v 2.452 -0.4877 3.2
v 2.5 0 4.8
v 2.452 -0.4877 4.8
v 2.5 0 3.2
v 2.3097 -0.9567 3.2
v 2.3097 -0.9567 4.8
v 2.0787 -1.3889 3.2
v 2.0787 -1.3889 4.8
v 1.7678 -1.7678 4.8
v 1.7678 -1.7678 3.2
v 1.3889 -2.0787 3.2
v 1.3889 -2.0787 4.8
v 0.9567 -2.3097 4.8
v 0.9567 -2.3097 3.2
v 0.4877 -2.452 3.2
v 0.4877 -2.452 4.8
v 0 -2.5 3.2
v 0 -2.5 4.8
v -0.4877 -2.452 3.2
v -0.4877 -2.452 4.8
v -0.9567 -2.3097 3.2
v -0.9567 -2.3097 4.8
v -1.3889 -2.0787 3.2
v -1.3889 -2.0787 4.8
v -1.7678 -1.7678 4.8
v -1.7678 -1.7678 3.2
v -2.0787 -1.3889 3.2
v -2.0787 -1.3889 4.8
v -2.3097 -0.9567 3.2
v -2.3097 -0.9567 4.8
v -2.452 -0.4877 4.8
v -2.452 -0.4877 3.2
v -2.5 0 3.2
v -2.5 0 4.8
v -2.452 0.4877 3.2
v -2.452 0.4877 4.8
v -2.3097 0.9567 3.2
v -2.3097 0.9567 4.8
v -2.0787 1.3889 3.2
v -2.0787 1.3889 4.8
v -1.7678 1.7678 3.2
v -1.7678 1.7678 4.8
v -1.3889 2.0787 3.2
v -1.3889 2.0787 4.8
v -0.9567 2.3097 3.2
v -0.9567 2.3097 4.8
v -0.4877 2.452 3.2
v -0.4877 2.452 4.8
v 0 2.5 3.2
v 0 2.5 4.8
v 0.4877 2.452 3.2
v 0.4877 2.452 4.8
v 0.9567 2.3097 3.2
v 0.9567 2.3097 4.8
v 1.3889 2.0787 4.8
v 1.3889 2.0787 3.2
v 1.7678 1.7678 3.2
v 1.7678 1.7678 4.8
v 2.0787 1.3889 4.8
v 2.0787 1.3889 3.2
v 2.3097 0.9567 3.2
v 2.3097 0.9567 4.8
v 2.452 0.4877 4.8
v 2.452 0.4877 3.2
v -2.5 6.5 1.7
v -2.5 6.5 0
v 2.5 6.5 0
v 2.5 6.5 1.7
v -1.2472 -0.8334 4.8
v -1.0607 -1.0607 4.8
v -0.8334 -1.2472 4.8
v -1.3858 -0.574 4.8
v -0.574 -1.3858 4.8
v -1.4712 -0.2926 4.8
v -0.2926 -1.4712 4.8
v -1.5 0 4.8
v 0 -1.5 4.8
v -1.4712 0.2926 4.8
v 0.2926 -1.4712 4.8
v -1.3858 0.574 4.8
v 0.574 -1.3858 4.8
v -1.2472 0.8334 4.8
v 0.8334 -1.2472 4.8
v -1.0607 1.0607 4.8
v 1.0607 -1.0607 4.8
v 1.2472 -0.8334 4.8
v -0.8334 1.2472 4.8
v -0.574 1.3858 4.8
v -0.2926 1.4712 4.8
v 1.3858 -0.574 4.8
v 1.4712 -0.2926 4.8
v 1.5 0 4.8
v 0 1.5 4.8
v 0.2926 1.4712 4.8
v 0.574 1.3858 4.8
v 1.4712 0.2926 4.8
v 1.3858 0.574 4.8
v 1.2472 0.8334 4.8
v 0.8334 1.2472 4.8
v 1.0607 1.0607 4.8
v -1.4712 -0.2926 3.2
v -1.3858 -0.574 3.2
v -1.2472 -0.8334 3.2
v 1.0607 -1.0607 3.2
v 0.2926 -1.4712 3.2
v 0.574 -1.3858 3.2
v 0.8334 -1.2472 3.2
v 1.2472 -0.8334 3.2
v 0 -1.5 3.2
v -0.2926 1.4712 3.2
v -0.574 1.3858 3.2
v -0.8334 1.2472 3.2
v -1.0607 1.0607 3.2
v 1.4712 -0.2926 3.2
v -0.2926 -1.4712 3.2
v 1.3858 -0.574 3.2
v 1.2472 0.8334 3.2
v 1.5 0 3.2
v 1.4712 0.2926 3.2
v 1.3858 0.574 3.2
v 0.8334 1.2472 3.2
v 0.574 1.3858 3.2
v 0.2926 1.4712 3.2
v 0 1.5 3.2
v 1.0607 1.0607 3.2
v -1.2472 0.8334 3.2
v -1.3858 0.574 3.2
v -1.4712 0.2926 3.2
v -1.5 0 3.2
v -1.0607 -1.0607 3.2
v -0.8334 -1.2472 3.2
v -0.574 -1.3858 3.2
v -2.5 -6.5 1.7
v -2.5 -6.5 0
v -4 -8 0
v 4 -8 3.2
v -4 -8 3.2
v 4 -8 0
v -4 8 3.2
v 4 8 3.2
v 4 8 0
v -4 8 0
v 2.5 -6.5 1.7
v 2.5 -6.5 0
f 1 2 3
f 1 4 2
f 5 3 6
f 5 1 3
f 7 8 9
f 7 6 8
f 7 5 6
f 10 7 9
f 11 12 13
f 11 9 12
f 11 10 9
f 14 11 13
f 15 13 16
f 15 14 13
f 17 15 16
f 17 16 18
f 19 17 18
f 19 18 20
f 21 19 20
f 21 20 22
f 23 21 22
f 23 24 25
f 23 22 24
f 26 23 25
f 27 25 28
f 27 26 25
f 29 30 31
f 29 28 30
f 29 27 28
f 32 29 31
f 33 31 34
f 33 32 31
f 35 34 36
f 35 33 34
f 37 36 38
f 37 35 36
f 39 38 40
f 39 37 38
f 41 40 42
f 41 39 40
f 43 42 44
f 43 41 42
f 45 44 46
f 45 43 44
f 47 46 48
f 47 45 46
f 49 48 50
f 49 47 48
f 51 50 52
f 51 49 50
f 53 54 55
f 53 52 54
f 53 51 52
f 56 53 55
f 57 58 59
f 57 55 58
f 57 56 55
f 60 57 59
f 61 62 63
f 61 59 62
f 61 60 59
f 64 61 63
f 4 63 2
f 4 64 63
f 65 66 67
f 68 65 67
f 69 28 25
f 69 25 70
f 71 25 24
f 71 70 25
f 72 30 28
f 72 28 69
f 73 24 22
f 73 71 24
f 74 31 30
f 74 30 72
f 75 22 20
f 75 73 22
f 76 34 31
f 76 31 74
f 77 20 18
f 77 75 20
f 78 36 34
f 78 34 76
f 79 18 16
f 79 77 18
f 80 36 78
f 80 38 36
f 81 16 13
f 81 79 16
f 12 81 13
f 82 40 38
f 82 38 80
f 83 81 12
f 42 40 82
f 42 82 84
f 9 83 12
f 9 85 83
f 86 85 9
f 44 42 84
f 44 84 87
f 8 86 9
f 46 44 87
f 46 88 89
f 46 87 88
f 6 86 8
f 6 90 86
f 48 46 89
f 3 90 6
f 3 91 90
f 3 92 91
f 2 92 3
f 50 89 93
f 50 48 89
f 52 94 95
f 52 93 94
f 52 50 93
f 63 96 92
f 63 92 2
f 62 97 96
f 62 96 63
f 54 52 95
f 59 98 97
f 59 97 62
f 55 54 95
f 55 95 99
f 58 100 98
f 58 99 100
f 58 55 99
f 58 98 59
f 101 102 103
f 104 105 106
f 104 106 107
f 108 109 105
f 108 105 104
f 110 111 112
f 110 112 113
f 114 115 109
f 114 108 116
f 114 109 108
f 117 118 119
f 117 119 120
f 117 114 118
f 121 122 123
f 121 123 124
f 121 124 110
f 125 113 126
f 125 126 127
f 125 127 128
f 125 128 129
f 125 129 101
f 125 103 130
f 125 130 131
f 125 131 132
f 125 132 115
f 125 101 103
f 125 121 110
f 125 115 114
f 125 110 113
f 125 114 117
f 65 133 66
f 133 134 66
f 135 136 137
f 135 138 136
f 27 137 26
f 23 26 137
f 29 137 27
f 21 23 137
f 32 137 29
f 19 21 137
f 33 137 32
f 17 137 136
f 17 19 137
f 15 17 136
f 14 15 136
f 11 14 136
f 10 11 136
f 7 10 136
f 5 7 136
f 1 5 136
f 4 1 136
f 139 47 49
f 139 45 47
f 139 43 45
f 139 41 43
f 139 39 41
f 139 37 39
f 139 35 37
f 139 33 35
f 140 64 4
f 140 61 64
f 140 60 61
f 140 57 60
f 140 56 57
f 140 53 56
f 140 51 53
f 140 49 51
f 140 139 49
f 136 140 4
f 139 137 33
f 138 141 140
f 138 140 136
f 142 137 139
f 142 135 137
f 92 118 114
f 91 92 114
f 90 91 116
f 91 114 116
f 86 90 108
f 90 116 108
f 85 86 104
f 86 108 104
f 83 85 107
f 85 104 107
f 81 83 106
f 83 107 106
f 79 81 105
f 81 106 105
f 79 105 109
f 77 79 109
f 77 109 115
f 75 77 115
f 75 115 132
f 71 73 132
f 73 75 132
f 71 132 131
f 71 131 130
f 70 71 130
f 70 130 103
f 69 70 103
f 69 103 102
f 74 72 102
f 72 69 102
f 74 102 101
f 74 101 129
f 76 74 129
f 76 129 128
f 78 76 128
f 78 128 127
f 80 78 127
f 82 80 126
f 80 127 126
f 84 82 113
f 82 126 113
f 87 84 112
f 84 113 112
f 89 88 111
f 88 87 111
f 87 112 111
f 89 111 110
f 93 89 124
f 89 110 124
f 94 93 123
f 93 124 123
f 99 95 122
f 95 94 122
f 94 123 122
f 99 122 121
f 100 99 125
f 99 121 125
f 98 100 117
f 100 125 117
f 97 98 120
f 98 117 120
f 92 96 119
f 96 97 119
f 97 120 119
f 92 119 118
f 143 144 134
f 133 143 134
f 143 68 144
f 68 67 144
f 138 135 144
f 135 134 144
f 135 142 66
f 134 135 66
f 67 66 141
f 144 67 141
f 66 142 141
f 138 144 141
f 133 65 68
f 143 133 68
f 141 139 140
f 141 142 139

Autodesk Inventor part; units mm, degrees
ref_plane "YZ Plane" through (0, 0, 0) normal (1, 0, 0) x (0, 1, 0)
ref_plane "XZ Plane" through (0, 0, 0) normal (0, 1, 0) x (-1, 0, 0)
ref_plane "XY Plane" through (0, 0, 0) normal (0, 0, 1) x (1, 0, 0)
sketch "Sketch1" plane through (0, 0, 0) normal (0, 0, 1) x (1, 0, 0)
  line L0 (-4, 8) -> (4, 8)
  line L1 (4, 8) -> (4, -8)
  line L2 (4, -8) -> (-4, -8)
  line L3 (-4, -8) -> (-4, 8)
  point P0 (0, 0)
  dimension "d0" = 8
  dimension "d1" = 16
  dimension "d2" = 4
  dimension "d3" = 8
extrude "Extrusion1" add sketch "Sketch1" along normal blind 3.2
shell "Shell1" thickness 1.5 removed faces 1 at (-1.3333, 2.6667, 0)
sketch "Sketch2" plane through (0, 0, 3.2) normal (0, 0, 1) x (1, 0, 0)
  circle A0 centre (0, -4) radius 2.5
  line L0 (4, 8) -> (4, -8) projected
  line L1 (4, -8) -> (-4, -8) projected
  dimension "d7" = 5
  dimension "d10" = 4
  dimension "d11" = 4
extrude "Extrusion2" [suppressed]
sketch "Sketch3" plane through (2.5, -6.5, 1.7) normal (0, 0, -1) x (-1, 0, 0)
  point P0 (2.5, 6.5)
extrude "Extrusion3" [suppressed]
pattern_linear "Rectangular Pattern1" [suppressed]
sketch "Sketch4" plane through (2.5, -6.5, 1.7) normal (0, 0, -1) x (-1, 0, 0)
  point P0 (2.5, 6.5)
extrude "Extrusion4" [suppressed]
pattern_linear "Rectangular Pattern2" [suppressed]
sketch "Sketch5" plane through (0, 0, 3.2) normal (0, 0, 1) x (1, 0, 0)
  circle A0 centre (0, 0) radius 2.5
  circle A1 centre (0, 0) radius 1.5
  dimension "d41" = 5
  dimension "d42" = 3
extrude "Extrusion5" add sketch "Sketch5" along normal blind 1.6
equation "\"d0\" = 8 * WIDTH"
equation "\"d1\" = 8 * LENGTH"
equation "\"d2\" = 0.5 * d0"
equation "\"d3\" = 0.5 * d1"
equation "\"d4\" = HEIGHT"
equation "\"WIDTH\" = 1"
equation "\"HEIGHT\" = 3.2"
equation "\"LENGTH\" = 2"
properties part number "3794" material "Steel"
